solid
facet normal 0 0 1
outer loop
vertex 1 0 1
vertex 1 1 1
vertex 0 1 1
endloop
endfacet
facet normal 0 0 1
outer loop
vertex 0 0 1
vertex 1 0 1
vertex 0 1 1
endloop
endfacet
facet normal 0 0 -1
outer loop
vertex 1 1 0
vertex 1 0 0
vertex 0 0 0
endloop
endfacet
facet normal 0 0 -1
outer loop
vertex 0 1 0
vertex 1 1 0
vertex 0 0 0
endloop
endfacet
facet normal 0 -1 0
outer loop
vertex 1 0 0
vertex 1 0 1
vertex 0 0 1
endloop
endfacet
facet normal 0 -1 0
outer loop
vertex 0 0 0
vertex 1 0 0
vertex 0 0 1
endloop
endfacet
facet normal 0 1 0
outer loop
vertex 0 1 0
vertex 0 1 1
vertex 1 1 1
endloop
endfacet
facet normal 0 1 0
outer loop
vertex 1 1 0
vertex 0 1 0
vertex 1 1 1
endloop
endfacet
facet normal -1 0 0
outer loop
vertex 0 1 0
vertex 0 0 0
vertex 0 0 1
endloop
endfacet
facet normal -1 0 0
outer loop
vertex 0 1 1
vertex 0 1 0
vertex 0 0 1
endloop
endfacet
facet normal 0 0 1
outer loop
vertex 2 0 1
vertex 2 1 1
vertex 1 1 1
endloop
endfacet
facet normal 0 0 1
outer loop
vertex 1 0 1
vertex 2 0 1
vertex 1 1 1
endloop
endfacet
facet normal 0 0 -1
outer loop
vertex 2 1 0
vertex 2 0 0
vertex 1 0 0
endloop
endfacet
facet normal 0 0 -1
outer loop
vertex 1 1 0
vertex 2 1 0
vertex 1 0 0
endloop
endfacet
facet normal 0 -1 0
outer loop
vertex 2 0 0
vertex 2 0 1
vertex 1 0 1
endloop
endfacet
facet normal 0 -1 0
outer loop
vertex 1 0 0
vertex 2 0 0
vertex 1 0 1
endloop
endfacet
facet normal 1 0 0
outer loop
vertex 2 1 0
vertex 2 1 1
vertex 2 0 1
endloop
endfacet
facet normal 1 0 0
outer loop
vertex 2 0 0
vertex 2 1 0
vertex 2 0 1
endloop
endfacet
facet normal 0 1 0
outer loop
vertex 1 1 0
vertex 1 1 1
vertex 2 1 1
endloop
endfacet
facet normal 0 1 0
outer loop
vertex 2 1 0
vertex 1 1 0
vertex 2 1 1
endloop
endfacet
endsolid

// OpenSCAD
//
// Attempt at gluing together two open-face cubes with a small gap.
// This should be fixable by Manifold's Merge() function.
//

e=1e-12;

polyhedron(
  points=[
    [0, 0, 0],
    [1-e, 0, 0],
    [0, 1, 0],
    [1-e, 1, 0],
    [0, 0, 1],
    [1-e, 0, 1],
    [0, 1, 1],
    [1-e, 1, 1],

    [1+e, 0, 0],
    [2, 0, 0],
    [1+e, 1, 0],
    [2, 1, 0],
    [1+e, 0, 1],
    [2, 0, 1],
    [1+e, 1, 1],
    [2, 1, 1],
  ],
  faces=[
    [6,7,5],[6,5,4],
    [0,1,3],[0,3,2],
    [4,5,1],[4,1,0],
    [7,6,2],[7,2,3],
    [4,0,2],[4,2,6],
    [14,15,13],[14,13,12],
    [8,9,11],[8,11,10],
    [12,13,9],[12,9,8],
    [13,15,11],[13,11,9],
    [15,14,10],[15,10,11],
  ]);
